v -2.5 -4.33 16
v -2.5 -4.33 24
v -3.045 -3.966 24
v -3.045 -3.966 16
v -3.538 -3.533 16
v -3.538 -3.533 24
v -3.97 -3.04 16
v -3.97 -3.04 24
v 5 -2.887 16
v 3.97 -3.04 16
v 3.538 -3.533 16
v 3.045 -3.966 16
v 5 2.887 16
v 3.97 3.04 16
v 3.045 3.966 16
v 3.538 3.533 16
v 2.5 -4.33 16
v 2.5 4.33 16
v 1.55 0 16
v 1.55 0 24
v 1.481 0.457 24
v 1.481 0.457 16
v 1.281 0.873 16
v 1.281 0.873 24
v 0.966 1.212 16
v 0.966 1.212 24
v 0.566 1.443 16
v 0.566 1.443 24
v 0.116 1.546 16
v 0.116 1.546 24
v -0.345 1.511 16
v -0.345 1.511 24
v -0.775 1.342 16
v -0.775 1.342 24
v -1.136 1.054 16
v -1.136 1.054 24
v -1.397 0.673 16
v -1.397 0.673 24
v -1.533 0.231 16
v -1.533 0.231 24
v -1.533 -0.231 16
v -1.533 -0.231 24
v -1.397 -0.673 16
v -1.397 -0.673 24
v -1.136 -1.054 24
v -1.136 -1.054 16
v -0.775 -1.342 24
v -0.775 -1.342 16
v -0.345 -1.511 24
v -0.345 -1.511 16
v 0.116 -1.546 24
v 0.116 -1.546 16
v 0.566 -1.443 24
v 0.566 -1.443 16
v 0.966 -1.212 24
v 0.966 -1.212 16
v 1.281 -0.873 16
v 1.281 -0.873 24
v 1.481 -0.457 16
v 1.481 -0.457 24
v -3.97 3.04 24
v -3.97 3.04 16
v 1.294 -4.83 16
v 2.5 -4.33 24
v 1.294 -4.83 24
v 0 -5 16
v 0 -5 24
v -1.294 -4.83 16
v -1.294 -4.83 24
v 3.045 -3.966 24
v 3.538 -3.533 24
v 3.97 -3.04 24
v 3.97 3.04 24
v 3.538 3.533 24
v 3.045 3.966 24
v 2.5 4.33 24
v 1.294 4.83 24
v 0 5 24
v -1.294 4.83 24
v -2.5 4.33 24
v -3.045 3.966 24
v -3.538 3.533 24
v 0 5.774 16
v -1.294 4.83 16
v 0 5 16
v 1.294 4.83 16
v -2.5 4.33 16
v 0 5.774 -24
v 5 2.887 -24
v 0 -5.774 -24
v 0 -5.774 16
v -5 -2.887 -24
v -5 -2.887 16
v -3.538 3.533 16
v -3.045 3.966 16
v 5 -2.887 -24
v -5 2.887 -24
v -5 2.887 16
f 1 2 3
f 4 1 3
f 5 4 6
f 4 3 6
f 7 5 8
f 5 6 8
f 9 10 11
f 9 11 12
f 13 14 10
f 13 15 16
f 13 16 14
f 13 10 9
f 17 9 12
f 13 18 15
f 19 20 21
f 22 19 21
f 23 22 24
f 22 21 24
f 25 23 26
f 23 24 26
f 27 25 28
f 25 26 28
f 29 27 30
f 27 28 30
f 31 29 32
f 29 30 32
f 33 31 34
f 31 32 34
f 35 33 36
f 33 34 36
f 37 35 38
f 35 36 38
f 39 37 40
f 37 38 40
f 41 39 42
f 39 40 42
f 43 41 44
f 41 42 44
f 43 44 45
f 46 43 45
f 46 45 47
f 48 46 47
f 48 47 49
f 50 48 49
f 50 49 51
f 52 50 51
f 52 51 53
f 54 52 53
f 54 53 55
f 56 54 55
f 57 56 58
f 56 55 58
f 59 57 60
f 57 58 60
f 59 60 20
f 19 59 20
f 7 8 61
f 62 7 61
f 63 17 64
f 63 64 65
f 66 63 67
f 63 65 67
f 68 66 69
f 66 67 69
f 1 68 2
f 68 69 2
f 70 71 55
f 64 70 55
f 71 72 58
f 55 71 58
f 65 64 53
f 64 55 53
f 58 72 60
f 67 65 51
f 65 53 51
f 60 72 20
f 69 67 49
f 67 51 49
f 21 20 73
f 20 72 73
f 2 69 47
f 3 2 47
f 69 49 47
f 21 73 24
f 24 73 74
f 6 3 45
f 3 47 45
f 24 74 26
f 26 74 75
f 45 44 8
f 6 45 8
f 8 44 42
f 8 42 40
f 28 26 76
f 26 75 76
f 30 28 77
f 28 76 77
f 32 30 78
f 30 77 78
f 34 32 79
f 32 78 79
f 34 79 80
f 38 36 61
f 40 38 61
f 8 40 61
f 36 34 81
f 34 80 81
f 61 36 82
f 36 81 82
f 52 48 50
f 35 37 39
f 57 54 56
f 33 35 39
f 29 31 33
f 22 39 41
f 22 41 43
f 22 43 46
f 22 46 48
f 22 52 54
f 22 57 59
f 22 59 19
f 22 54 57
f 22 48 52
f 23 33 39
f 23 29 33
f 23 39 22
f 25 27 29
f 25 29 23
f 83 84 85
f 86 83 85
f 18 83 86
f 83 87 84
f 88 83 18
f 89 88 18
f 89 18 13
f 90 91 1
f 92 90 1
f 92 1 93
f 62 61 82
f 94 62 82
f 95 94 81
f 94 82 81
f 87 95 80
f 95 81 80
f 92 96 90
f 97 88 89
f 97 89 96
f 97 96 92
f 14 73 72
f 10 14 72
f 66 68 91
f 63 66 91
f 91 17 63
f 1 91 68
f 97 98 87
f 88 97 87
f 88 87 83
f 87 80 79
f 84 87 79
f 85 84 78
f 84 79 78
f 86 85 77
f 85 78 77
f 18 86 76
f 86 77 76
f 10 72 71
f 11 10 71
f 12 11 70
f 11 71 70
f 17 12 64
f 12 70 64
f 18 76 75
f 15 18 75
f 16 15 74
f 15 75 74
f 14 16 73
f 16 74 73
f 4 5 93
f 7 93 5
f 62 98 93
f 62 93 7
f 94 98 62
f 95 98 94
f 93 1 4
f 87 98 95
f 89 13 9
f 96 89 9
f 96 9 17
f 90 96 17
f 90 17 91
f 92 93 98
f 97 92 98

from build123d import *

# Parameters (mm, degrees)
BOSS_EXTRUDE1_DEPTH = 24
SKETCH4_R           = 1.55
CUT_EXTRUDE1_DEPTH  = 8


with BuildPart() as part:
    # Sketch3 → Boss-Extrude1 (new, symmetric)
    with BuildSketch(Plane.XY):
        Polygon((0, 5.773502692), (5, 2.886751346), (5, -2.886751346), (0, -5.773502692), (-5, -2.886751346), (-5, 2.886751346), align=None)
    extrude(amount=BOSS_EXTRUDE1_DEPTH, both=True)

    # Sketch4 → Cut-Extrude1 (cut)
    with BuildSketch(Plane.XY.offset(24)):
        with BuildLine():
            Line((-5, -2.886751346), (-2.500000044, -4.330126993))
            ThreePointArc((-2.500000044, -4.330126993), (-3.298726627, -3.757446293), (-3.97, -3.039588788))
            Line((-3.97, -3.039588788), (-3.97, 3.039588788))
            ThreePointArc((-3.97, 3.039588788), (-3.298726623, 3.757446296), (-2.500000037, 4.330126998))
            Line((-2.500000037, 4.330126998), (-5, 2.886751346))
            Line((-5, 2.886751346), (-5, -2.886751346))
        make_face()
        with BuildLine():
            ThreePointArc((-2.500000037, 4.330126998), (-7.5e-08, 5), (2.499999906, 4.330127073))
            Line((2.499999906, 4.330127073), (0, 5.773502692))
            Line((0, 5.773502692), (-2.500000037, 4.330126998))
        make_face()
        with BuildLine():
            Line((3.97, 3.039588788), (3.97, -3.039588788))
            ThreePointArc((3.97, -3.039588788), (3.298726555, -3.757446356), (2.499999878, -4.330127089))
            Line((2.499999878, -4.330127089), (5, -2.886751346))
            Line((5, -2.886751346), (5, 2.886751346))
            Line((5, 2.886751346), (2.499999906, 4.330127073))
            ThreePointArc((2.499999906, 4.330127073), (3.298726567, 3.757446345), (3.97, 3.039588788))
        make_face()
        with BuildLine():
            Line((0, -5.773502692), (2.499999878, -4.330127089))
            ThreePointArc((2.499999878, -4.330127089), (-9.6e-08, -5), (-2.500000044, -4.330126993))
            Line((-2.500000044, -4.330126993), (0, -5.773502692))
        make_face()
        Circle(SKETCH4_R)
    extrude(amount=-CUT_EXTRUDE1_DEPTH, mode=Mode.SUBTRACT)


solid = part.part
